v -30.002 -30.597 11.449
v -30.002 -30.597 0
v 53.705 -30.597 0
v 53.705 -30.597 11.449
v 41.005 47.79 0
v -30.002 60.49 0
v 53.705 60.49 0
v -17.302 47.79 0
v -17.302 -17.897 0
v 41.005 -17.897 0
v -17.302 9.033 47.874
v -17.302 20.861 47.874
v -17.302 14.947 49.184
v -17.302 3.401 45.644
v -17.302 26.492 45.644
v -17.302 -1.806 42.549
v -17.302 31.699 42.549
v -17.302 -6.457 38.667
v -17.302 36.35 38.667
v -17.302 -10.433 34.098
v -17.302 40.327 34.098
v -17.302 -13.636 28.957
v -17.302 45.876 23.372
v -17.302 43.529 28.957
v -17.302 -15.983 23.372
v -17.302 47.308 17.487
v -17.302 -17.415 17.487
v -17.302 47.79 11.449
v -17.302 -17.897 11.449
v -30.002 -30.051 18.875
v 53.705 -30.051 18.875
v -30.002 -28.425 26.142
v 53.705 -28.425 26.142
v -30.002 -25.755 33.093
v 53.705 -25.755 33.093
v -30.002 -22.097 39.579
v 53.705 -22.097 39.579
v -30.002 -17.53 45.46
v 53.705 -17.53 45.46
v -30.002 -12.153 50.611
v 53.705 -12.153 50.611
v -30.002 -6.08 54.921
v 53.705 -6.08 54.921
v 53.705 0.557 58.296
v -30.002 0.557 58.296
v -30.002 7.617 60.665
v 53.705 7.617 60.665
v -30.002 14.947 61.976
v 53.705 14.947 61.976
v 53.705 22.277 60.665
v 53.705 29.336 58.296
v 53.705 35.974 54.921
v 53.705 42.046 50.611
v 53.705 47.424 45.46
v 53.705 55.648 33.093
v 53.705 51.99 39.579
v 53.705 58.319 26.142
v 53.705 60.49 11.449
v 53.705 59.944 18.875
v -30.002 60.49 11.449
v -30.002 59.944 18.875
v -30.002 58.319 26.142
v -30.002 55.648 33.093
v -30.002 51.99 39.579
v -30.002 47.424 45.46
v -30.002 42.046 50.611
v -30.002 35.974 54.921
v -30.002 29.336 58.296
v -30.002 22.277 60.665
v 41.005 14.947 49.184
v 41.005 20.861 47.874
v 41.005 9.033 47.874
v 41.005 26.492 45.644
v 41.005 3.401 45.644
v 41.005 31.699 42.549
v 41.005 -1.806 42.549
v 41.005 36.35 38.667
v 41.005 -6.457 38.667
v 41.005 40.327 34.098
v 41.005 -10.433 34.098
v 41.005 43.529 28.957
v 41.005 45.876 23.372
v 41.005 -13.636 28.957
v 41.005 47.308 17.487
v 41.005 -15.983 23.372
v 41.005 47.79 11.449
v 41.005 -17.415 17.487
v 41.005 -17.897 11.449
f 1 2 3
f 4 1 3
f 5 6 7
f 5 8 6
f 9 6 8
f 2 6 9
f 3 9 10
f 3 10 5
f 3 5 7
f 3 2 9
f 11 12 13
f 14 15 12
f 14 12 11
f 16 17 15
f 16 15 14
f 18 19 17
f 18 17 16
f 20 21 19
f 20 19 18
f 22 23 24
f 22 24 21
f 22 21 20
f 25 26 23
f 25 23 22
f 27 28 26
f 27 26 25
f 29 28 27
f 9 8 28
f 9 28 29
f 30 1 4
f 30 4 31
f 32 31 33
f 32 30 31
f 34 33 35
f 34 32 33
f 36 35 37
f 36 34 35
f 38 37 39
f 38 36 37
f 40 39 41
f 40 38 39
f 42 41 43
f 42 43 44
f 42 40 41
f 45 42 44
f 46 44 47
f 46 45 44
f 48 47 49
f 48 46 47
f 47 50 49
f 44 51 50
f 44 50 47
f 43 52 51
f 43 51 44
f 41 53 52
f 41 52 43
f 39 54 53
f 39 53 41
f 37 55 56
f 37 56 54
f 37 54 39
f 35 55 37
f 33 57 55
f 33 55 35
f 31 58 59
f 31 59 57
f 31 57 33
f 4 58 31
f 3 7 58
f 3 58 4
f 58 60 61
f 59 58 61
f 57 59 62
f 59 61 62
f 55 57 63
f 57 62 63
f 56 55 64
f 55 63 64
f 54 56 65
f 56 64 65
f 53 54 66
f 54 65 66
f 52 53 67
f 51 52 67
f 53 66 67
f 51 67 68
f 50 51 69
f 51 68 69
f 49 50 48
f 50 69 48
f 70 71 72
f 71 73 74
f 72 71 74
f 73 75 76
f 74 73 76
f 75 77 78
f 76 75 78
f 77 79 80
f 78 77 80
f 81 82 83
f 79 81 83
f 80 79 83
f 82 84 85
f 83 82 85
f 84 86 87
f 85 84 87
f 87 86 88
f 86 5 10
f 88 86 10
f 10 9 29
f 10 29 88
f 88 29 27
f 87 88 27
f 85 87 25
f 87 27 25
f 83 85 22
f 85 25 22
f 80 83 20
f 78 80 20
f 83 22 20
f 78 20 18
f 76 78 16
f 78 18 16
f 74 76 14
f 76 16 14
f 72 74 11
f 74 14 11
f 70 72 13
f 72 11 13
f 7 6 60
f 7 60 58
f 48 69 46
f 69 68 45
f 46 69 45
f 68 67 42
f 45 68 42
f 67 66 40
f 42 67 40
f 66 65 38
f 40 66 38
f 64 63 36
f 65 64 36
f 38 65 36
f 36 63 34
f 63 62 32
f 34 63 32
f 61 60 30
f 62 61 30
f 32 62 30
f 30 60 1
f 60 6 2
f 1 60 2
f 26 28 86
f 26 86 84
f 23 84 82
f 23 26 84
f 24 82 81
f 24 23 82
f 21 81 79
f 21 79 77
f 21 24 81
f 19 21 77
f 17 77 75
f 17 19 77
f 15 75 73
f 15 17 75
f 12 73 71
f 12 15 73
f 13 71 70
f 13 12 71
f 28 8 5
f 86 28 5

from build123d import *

# Parameters (mm, degrees)
F0_W        = 83.7067794055
F0_H        = 45.5432236195
F1_DEPTH    = 61.976
F2_T1_DEPTH = 336.3431931548
F3_T        = -12.7


# Not quite as in the source:
# - a fillet or chamfer that OpenCascade refuses, or shapes differently, is made with other operations: its cross-section is extruded or revolved along the edge and cut away or added


with BuildPart() as f1:
    # F0 (on Top) → F1 (new body)
    with BuildSketch(Plane.XY):
        with Locations((11.8514457718, -7.8249704093)):
            Rectangle(F0_W, F0_H)
    extrude(amount=F1_DEPTH)

    # F2: fillet of radius 50.8 on 1 edges, made by hand

    # F2_s2 → F2_t1 (cut)
    with BuildSketch(Plane.YZ.offset(-156.3201508057)):
        with BuildLine():
            ThreePointArc((-30.596582219, 11.4487172501), (-17.5304147843, 45.4604487546), (14.9466414005, 61.976))
            Line((14.9466414005, 61.976), (-30.596582219, 61.976))
            Line((-30.596582219, 61.976), (-30.596582219, 11.4487172501))
        make_face()
    extrude(amount=F2_T1_DEPTH, mode=Mode.SUBTRACT)

    # F3
    f3_openings = [f1.faces().sort_by_distance(p)[0] for p in [
        (11.851446, 14.946641, 30.988),
        (11.851446, -7.82497, 0),
    ]]
    offset(amount=F3_T, openings=f3_openings)

    # F4: F1 across face


with BuildPart() as f1_1:
    add(f1.part)
    add(f1.part.mirror(Plane(origin=(11.8514457718, 14.9466414005, 38.893861799), x_dir=(-1, 0, 0), z_dir=(0, 1, 0))))


solid = f1_1.part
